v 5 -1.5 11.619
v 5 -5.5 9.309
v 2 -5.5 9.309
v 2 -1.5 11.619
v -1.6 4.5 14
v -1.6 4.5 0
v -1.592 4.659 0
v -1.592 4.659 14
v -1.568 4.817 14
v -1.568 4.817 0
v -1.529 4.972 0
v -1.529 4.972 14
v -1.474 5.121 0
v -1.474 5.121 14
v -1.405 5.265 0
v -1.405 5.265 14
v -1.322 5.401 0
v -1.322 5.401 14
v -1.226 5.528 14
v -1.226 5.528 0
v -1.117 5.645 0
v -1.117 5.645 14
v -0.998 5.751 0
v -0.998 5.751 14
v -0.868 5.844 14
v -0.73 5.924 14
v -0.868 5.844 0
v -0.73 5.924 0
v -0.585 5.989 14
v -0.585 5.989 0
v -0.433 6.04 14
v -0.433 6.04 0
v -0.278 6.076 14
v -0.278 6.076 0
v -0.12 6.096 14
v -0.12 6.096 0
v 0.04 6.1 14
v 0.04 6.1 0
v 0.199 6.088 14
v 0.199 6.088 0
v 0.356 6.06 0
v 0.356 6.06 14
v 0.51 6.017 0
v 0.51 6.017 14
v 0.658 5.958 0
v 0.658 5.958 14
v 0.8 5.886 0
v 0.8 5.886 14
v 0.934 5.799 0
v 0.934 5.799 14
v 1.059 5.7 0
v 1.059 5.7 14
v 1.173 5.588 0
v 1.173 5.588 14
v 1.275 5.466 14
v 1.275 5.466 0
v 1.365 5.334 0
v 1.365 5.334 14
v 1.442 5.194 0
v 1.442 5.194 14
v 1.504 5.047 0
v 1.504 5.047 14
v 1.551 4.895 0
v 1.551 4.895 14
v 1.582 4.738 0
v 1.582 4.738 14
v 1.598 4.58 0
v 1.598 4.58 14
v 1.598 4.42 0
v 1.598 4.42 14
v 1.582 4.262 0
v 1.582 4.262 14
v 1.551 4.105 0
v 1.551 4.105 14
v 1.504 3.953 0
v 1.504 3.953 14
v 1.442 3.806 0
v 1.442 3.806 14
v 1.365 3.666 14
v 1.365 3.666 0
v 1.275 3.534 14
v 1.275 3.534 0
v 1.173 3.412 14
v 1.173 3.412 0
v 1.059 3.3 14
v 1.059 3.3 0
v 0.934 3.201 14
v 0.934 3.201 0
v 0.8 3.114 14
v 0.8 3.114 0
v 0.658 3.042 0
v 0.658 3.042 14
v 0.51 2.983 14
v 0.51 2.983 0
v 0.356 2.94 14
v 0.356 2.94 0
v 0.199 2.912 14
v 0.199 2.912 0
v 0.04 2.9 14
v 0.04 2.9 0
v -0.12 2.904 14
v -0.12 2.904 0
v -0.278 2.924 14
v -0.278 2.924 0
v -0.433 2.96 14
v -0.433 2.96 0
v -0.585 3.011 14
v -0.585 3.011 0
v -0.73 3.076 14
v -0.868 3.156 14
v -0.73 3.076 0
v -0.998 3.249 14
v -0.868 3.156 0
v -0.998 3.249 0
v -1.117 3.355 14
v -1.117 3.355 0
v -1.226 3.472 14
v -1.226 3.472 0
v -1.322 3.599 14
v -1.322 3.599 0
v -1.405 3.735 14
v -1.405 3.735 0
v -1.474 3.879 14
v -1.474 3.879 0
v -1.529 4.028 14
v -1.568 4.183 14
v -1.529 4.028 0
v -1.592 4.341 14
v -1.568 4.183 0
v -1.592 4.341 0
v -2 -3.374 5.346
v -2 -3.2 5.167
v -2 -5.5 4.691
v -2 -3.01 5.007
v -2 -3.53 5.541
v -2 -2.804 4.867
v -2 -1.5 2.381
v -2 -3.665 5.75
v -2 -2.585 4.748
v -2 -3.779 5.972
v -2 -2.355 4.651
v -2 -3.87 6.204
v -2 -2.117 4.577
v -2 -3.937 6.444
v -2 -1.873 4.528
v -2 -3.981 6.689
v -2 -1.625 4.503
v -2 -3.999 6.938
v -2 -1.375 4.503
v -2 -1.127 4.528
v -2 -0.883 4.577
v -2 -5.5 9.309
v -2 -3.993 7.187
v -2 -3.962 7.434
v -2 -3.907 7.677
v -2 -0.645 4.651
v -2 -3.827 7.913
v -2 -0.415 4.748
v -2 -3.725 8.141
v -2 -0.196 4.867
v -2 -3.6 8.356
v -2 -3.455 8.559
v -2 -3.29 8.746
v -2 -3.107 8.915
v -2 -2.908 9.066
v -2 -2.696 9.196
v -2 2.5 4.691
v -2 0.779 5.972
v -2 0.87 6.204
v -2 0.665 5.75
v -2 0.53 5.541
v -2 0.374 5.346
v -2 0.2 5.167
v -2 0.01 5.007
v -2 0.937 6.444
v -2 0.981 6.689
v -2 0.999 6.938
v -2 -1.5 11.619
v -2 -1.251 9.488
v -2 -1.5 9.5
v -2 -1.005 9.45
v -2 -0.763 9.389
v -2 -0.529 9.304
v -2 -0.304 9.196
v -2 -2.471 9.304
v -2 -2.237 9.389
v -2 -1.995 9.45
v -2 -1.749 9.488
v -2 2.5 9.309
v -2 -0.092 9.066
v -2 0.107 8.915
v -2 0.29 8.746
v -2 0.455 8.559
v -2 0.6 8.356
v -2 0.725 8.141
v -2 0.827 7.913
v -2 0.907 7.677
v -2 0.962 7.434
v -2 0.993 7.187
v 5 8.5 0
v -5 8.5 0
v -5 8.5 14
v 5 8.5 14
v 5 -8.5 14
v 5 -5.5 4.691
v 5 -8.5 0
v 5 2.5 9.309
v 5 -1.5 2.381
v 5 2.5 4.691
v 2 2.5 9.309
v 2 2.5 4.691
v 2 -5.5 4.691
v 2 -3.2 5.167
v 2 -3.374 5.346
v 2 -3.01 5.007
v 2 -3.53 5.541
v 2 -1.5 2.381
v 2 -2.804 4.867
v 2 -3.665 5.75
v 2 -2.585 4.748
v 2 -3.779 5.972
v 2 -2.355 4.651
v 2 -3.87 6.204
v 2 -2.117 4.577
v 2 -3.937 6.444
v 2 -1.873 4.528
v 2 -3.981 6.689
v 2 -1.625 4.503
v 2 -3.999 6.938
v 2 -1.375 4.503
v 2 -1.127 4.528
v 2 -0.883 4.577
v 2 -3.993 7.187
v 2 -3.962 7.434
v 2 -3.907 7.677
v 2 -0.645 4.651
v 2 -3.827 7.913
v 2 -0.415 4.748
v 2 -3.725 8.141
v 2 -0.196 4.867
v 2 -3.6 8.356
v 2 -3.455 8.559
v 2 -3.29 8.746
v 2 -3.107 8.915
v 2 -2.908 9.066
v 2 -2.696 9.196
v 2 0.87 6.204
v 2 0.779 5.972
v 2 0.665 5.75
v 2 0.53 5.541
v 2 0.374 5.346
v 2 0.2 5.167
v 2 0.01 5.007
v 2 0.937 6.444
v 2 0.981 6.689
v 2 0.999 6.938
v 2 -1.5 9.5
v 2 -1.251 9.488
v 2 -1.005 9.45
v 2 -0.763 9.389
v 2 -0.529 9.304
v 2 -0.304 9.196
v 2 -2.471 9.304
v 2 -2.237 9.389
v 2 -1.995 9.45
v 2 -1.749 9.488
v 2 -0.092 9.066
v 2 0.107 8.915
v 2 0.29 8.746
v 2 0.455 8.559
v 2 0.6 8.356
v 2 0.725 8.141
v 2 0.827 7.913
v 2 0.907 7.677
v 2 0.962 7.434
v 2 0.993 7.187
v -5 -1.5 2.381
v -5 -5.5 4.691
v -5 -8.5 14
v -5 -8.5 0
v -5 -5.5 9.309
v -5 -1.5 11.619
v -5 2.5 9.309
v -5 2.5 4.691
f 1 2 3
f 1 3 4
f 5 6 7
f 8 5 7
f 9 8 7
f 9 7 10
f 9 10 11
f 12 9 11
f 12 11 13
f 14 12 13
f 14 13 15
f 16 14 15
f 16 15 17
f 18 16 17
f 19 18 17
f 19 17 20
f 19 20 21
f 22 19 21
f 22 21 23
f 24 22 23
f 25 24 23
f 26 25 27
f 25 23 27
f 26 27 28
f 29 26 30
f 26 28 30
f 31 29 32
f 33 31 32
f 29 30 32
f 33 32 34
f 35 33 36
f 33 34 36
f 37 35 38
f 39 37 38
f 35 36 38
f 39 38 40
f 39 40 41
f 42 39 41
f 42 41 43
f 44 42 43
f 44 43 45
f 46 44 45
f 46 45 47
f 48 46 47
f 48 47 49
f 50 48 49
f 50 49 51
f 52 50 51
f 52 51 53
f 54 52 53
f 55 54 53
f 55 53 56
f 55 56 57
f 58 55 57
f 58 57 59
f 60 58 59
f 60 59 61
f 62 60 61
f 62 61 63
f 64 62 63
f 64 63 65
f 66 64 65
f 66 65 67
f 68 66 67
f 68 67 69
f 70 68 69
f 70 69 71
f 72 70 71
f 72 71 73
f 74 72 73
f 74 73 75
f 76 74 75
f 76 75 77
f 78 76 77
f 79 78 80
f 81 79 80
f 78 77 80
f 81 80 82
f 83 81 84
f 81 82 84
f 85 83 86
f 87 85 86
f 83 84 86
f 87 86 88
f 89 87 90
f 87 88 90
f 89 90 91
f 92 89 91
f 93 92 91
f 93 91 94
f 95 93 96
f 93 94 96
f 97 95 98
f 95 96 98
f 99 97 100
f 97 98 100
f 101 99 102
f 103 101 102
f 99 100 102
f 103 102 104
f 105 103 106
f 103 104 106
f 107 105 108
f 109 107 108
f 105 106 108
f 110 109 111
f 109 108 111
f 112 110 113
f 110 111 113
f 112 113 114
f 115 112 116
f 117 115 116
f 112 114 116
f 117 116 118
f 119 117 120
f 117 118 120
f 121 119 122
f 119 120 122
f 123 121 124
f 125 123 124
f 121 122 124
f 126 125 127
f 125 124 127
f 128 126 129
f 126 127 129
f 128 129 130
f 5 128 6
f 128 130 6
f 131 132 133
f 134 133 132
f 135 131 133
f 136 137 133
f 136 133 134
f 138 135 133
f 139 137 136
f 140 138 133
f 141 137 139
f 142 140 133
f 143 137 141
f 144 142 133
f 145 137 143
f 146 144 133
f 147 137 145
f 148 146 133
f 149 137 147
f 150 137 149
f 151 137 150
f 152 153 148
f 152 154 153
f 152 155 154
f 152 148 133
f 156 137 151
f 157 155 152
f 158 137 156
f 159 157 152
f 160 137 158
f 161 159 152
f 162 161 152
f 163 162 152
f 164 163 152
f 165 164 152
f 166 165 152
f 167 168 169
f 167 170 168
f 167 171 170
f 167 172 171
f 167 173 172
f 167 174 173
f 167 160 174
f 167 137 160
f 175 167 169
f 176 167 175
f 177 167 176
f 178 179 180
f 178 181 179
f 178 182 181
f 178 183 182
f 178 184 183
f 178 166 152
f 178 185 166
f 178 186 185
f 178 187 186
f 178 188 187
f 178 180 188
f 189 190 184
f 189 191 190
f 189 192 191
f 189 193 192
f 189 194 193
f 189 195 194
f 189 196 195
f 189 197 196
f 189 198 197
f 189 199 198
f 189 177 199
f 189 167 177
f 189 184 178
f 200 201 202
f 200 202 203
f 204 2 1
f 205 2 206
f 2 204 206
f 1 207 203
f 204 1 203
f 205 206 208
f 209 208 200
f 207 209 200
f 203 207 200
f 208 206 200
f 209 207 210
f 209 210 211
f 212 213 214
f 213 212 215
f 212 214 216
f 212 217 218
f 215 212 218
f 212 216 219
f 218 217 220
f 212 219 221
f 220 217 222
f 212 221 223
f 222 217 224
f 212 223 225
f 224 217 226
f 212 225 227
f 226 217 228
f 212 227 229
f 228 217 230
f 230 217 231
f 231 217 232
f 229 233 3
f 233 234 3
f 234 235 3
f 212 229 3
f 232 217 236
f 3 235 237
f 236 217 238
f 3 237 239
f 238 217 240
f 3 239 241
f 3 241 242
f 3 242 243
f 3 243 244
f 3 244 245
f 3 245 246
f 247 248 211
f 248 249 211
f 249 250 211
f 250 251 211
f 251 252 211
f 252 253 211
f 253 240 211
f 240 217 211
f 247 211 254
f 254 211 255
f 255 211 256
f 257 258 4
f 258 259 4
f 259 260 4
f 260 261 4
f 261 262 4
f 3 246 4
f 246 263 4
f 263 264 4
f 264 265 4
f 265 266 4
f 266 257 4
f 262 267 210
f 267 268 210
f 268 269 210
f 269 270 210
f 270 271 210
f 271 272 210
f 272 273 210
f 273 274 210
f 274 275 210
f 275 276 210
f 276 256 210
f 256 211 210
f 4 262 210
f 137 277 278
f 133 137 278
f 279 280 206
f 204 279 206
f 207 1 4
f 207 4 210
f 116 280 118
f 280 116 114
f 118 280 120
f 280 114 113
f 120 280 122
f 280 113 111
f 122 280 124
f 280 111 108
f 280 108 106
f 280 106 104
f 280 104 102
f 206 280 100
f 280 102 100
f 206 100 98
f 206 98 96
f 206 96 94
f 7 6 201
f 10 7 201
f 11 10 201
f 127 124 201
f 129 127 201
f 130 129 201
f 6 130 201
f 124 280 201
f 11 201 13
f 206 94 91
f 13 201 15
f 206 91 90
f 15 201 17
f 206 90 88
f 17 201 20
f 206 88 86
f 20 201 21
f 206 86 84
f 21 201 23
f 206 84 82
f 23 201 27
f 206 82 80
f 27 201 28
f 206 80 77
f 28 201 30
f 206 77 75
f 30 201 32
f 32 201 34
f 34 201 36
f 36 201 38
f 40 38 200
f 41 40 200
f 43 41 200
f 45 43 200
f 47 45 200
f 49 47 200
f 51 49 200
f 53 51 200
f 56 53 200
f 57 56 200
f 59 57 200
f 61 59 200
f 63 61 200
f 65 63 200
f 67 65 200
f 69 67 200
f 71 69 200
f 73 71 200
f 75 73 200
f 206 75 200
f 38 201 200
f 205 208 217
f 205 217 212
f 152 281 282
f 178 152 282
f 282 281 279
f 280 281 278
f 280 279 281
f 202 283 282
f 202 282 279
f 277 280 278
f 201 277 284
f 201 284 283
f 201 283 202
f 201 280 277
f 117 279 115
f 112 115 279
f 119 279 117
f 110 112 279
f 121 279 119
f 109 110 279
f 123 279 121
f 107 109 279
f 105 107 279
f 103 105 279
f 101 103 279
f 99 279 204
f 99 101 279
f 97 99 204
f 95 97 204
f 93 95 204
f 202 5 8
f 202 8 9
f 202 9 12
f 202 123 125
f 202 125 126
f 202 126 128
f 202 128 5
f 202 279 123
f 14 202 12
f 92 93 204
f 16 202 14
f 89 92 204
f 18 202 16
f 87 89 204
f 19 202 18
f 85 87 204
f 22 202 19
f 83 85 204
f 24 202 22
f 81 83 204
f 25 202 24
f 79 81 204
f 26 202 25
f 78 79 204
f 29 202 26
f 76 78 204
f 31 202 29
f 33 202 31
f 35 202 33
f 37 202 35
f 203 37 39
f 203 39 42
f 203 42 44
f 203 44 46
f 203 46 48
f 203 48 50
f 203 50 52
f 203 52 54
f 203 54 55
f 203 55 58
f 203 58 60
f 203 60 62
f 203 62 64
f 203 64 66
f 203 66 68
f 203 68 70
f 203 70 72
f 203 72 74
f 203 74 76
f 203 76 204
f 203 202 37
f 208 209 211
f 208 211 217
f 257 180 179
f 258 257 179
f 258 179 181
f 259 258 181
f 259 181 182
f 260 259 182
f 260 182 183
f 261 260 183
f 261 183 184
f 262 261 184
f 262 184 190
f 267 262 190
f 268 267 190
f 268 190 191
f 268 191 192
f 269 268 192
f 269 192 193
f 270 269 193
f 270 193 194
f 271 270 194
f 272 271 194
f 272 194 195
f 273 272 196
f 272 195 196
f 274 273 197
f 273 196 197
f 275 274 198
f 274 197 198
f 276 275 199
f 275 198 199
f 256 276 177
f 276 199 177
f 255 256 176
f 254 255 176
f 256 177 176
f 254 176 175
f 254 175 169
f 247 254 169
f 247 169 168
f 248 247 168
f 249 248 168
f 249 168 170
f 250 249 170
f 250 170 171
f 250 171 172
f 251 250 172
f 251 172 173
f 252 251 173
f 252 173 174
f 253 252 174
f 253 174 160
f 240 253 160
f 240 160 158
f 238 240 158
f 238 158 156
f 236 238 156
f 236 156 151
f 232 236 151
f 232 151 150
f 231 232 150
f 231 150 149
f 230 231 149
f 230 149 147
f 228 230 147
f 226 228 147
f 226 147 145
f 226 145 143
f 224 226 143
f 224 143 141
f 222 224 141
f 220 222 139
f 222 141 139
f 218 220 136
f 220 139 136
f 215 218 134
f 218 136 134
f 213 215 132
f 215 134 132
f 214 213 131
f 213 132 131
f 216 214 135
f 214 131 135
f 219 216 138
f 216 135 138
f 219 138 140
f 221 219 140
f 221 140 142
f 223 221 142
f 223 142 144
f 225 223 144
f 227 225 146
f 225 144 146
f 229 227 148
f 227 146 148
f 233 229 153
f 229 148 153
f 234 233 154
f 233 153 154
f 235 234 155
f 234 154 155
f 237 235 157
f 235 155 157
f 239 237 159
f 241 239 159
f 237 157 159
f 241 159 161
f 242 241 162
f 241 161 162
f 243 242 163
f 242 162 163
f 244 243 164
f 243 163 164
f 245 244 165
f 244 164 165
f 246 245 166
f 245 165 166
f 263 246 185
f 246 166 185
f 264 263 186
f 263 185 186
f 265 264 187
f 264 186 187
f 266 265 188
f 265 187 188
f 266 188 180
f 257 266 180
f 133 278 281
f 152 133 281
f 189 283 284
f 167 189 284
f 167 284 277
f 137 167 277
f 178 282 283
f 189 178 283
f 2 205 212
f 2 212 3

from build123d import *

# Parameters (mm, degrees)
SKETCH1_W           = 10
SKETCH1_H           = 17
BOSS_EXTRUDE1_DEPTH = 14
SKETCH2_R           = 1.6
CUT_EXTRUDE1_DEPTH  = 15
CUT_EXTRUDE2_DEPTH  = 3
SKETCH5_R           = 2.5
CUT_EXTRUDE3_DEPTH  = 8


with BuildPart() as part:
    # Sketch1 → Boss-Extrude1 (new body)
    with BuildSketch(Plane.XY):
        Rectangle(SKETCH1_W, SKETCH1_H)
    extrude(amount=BOSS_EXTRUDE1_DEPTH)

    # Sketch2 → Cut-Extrude1 (cut, through all)
    with BuildSketch(Plane(origin=(0, 0, 0), x_dir=(-1, 0, 0), z_dir=(0, 0, -1))):
        with Locations((0, 4.5)):
            Circle(SKETCH2_R)
    extrude(amount=-CUT_EXTRUDE1_DEPTH, mode=Mode.SUBTRACT)

    # Sketch3 → Cut-Extrude2 (cut)
    with BuildSketch(Plane.ZY.offset(5)):
        Polygon((2.381197846, -1.5), (4.690598923, -5.5), (9.309401077, -5.5), (11.618802154, -1.5), (9.309401077, 2.5), (4.690598923, 2.5), align=None)
    cut_extrude2 = extrude(amount=-CUT_EXTRUDE2_DEPTH, mode=Mode.SUBTRACT)

    # Sketch5 → Cut-Extrude3 (cut, through all)
    with BuildSketch(Plane.ZY.offset(2)):
        with Locations((7, -1.5)):
            Circle(SKETCH5_R)
    extrude(amount=-CUT_EXTRUDE3_DEPTH, mode=Mode.SUBTRACT)

    # Mirror1: Cut-Extrude2 across plane
    add(cut_extrude2.mirror(Plane(origin=(0, 0, 0), x_dir=(0, 0, 1), z_dir=(1, 0, 0))), mode=Mode.SUBTRACT)


solid = part.part
